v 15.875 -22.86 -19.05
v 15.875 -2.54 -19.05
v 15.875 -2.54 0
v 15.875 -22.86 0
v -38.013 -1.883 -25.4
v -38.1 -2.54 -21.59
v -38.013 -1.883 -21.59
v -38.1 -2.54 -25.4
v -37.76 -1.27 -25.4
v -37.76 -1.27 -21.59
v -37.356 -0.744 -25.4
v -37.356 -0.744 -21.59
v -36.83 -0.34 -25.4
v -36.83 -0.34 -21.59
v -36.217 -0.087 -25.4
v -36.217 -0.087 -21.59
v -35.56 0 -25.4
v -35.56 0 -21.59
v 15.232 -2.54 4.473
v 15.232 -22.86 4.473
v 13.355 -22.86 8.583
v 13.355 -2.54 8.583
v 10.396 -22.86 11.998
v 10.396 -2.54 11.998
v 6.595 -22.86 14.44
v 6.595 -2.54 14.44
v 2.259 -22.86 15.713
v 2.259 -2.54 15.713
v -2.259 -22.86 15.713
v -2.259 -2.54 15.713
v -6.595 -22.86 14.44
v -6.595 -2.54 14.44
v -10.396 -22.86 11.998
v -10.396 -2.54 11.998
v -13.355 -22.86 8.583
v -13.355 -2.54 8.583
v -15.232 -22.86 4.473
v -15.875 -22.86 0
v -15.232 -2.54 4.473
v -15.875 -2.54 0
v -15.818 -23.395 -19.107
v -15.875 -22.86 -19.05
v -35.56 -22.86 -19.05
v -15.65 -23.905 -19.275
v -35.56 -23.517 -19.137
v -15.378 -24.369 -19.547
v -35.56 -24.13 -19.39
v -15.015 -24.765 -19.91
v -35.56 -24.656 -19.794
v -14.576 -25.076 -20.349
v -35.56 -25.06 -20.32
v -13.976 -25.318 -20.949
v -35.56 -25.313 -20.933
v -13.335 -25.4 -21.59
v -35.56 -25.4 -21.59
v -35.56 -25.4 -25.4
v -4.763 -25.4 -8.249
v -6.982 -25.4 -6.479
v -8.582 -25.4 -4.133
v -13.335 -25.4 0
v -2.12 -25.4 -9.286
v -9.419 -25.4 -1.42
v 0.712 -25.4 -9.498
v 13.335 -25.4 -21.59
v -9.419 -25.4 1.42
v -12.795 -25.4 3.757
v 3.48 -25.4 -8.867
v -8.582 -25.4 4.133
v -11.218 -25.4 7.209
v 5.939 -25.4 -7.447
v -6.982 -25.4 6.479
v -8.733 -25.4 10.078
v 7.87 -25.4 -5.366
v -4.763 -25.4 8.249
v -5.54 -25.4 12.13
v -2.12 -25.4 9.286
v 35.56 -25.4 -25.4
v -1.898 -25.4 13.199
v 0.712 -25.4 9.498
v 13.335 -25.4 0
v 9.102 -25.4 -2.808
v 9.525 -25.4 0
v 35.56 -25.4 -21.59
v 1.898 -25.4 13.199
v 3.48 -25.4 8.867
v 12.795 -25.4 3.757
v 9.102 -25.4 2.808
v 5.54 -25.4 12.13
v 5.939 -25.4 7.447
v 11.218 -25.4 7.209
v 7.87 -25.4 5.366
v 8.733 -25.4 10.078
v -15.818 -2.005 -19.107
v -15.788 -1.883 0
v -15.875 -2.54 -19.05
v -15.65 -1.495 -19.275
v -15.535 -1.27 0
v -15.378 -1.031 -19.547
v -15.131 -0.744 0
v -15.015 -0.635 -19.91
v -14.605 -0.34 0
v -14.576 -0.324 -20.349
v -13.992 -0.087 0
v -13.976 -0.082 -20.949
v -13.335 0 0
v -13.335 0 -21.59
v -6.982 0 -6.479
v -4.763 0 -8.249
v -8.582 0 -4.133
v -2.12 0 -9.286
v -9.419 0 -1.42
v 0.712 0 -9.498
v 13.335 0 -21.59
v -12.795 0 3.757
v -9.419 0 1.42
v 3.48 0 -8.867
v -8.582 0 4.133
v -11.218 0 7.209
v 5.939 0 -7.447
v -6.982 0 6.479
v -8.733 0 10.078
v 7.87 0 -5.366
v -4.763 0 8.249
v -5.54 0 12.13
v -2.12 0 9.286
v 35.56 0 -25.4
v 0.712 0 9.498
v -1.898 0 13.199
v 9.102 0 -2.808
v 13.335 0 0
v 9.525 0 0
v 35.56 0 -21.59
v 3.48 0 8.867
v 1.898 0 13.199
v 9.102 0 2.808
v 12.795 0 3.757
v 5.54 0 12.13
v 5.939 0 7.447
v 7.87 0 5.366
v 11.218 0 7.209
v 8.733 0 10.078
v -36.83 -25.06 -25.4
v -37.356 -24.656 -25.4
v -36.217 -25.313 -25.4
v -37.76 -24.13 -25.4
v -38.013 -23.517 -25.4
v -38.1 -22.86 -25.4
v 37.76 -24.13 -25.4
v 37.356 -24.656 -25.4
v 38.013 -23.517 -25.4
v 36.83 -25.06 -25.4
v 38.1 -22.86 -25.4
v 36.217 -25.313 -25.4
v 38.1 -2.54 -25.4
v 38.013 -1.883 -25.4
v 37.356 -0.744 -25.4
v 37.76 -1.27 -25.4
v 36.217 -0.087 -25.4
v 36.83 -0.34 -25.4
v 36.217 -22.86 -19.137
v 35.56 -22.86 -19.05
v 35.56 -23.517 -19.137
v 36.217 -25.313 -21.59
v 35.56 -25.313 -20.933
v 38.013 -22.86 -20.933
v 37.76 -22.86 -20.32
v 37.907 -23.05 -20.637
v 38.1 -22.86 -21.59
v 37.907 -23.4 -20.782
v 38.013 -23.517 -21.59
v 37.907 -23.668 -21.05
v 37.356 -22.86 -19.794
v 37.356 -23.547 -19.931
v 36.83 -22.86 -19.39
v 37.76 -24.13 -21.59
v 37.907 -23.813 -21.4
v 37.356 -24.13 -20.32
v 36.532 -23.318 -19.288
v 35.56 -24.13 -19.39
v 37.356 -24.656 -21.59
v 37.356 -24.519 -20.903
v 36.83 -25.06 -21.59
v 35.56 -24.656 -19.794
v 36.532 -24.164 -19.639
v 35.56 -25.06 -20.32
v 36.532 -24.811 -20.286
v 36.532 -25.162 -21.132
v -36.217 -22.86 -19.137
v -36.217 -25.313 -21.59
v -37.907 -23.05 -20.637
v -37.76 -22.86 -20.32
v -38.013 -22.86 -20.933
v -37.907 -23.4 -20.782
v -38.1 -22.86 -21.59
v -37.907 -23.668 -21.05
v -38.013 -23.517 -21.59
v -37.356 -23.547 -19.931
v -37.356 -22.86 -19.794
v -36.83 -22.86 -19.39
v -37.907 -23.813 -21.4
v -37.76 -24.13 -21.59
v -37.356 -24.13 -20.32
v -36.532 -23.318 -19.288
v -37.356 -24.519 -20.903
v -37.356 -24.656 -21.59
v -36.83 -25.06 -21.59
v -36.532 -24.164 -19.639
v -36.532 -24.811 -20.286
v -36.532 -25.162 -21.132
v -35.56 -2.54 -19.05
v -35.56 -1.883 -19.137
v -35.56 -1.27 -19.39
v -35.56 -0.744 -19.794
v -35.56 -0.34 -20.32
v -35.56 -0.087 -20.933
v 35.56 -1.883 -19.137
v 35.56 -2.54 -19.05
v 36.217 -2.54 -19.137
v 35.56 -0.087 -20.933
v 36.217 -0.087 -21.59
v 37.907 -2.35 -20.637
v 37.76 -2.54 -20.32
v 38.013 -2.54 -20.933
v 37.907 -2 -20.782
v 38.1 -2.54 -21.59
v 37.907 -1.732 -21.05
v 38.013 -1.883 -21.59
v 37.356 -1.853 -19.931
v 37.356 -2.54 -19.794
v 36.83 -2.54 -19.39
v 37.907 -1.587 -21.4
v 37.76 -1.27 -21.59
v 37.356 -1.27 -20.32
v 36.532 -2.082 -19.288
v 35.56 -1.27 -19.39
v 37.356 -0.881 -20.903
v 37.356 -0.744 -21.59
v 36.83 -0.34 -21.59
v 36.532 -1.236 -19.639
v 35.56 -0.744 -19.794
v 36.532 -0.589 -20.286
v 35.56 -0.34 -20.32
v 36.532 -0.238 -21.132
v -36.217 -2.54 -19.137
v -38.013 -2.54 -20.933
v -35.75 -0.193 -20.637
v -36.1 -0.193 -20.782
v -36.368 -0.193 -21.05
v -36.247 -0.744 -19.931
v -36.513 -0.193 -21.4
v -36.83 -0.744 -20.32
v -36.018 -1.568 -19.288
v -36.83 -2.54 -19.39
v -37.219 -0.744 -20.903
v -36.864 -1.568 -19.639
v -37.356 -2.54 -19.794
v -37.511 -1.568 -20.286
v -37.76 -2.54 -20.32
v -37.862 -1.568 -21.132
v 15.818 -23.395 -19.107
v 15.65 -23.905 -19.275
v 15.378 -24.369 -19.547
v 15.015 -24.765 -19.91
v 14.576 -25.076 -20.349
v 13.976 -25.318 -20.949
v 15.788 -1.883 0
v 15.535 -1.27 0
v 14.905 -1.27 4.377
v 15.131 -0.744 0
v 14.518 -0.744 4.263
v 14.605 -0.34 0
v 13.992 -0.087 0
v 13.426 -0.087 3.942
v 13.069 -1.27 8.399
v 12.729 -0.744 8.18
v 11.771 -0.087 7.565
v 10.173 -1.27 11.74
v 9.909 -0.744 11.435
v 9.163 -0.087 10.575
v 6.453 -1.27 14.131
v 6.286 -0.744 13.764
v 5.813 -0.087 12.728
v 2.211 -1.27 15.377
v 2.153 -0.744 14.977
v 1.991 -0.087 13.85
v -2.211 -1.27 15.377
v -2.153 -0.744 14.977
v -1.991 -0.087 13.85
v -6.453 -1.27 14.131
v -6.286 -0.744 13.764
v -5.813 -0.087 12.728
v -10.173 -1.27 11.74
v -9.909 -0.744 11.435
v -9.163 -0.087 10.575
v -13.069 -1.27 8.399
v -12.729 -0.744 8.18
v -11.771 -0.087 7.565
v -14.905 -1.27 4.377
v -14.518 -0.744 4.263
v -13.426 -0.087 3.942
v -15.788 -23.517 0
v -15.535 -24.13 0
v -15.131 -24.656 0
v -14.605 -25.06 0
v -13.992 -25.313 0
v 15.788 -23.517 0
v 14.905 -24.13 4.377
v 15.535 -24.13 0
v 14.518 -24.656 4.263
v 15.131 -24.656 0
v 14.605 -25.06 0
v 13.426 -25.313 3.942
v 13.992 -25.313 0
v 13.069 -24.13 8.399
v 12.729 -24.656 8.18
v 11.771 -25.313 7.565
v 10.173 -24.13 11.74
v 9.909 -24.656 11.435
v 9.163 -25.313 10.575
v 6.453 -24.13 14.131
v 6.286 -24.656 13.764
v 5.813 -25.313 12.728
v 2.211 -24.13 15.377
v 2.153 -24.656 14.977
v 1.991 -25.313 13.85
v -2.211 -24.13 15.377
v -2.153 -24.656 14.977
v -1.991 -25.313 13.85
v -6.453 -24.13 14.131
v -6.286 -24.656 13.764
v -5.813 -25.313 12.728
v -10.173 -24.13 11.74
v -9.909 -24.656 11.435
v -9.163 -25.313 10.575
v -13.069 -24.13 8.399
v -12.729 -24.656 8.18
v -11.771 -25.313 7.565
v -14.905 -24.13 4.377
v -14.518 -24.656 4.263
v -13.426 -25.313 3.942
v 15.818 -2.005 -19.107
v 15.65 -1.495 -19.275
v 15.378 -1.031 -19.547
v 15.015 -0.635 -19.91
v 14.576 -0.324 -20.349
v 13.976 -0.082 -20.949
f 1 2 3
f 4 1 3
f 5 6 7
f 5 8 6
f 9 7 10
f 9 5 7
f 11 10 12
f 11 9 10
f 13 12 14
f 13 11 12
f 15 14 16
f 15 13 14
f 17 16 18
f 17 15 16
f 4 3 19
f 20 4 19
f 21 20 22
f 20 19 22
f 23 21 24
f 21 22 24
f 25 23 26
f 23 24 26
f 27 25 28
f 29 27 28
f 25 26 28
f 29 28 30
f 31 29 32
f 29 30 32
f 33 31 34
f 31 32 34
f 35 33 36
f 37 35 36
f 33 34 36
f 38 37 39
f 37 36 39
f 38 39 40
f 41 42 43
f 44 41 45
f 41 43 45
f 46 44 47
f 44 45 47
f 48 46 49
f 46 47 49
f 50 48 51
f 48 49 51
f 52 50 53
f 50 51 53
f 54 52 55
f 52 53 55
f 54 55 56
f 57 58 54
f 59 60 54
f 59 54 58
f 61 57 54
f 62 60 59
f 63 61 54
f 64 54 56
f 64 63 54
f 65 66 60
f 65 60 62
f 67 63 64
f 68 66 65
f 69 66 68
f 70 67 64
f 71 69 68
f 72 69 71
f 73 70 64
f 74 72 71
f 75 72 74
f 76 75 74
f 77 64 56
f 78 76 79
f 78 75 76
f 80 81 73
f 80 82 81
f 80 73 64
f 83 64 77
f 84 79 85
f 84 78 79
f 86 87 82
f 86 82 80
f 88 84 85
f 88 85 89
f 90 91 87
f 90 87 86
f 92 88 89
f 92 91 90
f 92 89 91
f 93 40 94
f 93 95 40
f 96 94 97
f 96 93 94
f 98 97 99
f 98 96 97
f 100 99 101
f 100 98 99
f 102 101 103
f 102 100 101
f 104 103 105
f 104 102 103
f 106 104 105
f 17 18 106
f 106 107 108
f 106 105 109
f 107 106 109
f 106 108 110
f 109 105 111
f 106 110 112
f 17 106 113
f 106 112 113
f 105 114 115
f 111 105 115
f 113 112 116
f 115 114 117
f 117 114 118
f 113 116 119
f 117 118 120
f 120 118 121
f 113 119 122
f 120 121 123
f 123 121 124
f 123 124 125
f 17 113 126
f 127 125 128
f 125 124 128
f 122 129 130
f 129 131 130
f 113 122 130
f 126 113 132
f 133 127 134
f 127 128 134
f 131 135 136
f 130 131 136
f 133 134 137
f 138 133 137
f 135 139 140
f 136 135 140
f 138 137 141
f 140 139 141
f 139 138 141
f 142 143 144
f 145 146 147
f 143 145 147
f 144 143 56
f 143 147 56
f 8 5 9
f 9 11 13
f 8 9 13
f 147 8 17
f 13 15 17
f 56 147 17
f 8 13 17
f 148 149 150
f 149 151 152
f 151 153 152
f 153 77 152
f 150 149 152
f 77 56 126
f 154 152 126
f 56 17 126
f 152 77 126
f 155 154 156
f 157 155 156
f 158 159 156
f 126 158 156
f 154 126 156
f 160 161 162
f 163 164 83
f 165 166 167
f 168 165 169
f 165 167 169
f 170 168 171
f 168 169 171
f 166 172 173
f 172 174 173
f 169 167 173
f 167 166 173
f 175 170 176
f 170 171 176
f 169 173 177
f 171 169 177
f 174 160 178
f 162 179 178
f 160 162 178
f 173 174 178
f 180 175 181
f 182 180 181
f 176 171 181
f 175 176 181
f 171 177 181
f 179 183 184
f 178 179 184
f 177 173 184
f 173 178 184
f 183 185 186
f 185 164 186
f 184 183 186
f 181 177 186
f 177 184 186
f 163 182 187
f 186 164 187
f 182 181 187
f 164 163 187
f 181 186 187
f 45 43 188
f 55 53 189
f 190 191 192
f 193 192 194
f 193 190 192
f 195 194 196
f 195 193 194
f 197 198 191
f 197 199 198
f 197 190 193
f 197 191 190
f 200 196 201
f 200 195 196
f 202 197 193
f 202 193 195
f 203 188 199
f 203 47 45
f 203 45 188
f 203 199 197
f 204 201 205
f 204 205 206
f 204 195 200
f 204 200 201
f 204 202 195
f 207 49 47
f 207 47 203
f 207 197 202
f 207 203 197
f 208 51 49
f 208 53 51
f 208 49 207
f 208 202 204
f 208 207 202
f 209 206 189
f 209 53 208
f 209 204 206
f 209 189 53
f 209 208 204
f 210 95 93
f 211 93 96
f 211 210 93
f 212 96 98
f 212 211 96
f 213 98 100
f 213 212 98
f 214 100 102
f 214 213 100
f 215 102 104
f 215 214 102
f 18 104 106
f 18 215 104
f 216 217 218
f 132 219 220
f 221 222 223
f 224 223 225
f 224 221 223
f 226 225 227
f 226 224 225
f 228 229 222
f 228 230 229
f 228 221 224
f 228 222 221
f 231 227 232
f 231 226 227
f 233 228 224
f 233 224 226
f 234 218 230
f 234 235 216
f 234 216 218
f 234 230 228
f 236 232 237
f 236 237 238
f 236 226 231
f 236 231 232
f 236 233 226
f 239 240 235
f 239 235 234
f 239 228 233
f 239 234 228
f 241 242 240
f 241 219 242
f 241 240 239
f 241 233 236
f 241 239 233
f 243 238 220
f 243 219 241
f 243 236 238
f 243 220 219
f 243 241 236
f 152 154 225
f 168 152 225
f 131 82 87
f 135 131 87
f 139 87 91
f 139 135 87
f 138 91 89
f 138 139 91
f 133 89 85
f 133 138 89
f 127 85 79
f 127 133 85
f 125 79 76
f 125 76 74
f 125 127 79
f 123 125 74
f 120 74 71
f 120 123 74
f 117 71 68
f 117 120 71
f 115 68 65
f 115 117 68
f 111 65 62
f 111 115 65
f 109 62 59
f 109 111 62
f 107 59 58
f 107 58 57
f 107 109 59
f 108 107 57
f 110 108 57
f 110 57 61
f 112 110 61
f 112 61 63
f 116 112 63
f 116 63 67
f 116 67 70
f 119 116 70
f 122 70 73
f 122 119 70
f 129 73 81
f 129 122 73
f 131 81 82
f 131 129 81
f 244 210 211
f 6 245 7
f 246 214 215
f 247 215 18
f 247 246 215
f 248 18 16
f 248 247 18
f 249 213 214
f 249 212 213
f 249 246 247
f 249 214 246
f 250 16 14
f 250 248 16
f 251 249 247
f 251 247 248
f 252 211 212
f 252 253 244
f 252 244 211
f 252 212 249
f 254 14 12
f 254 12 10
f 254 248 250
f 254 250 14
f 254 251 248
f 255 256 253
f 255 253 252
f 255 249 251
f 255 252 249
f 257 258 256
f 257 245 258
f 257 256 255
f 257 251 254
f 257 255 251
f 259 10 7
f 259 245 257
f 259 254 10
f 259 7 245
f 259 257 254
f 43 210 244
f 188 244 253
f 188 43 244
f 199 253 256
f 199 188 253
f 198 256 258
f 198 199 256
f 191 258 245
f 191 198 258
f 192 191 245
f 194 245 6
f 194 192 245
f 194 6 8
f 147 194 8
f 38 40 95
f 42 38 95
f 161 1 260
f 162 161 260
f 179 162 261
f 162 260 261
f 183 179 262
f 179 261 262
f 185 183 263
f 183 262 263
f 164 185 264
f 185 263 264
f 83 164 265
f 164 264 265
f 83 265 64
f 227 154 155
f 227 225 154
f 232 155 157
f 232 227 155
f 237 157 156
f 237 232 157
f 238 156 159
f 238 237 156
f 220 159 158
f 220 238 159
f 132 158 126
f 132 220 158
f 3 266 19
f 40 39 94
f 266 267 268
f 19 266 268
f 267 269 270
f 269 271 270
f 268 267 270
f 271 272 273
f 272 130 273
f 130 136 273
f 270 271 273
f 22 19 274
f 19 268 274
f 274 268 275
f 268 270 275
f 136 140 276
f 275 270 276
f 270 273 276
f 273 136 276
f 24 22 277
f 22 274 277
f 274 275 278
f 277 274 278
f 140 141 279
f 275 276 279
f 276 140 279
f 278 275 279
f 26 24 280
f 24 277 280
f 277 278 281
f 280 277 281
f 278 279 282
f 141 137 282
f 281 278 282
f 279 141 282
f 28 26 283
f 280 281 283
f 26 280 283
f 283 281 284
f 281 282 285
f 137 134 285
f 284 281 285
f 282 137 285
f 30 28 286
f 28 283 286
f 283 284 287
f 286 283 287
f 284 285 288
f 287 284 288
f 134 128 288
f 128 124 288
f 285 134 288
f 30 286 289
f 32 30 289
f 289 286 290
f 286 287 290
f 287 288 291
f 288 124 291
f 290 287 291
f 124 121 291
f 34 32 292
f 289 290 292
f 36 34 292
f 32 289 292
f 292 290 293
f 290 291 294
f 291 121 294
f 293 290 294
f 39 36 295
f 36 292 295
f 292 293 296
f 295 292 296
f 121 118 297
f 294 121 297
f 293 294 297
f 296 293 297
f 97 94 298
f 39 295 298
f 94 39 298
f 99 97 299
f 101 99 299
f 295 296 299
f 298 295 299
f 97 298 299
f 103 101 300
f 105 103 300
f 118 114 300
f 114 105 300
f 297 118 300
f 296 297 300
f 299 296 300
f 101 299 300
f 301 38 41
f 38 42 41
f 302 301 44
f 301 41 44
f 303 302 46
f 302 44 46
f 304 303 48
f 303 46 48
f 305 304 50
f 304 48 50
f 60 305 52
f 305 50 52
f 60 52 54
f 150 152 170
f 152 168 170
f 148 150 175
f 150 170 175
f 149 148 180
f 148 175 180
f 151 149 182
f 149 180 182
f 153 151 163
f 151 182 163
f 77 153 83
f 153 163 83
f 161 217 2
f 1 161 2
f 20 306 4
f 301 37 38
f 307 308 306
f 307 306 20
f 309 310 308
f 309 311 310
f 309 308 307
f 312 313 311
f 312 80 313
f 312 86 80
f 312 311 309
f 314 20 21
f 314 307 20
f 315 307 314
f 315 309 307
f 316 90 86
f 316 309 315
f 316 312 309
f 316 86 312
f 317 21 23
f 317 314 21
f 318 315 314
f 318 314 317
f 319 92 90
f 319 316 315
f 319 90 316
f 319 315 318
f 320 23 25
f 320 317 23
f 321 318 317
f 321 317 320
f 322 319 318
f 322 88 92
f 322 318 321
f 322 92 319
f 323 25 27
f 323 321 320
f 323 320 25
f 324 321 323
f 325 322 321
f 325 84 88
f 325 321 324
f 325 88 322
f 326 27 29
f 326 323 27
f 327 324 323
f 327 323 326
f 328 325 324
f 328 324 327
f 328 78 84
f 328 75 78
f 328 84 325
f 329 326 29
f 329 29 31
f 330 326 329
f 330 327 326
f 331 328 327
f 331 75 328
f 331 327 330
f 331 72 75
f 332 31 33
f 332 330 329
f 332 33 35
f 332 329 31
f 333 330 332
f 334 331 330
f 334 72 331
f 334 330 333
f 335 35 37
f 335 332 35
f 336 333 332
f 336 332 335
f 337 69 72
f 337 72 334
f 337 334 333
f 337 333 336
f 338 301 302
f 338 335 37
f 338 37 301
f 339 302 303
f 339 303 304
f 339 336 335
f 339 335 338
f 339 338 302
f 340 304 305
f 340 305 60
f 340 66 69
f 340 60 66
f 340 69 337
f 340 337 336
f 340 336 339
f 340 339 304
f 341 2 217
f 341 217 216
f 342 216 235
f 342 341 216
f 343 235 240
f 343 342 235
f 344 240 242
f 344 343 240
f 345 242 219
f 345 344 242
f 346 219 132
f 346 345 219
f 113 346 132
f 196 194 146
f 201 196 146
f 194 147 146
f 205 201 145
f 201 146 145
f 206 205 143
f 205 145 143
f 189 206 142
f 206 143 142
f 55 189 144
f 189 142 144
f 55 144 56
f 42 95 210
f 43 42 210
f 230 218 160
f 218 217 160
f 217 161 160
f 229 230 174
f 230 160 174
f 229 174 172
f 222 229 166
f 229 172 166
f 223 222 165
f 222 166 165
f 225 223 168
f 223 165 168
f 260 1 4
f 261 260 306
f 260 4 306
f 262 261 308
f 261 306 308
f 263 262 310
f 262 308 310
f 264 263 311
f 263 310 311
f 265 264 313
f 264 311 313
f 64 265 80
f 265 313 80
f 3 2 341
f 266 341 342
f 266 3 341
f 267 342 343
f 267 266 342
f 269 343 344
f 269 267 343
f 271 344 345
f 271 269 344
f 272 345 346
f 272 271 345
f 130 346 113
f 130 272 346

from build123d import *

# Parameters (mm, degrees)
F0_R     = 9.525
F1_DEPTH = 25.4
F2_R     = 2.54


with BuildPart() as f1:
    # F0 (on Front) → F1 (new body)
    with BuildSketch(Plane.XZ):
        with BuildLine():
            Line((15.875, -19.05), (15.875, 0))
            ThreePointArc((15.875, 0), (0, 15.875), (-15.875, 0))
            Line((-15.875, 0), (-15.875, -19.05))
            Line((-15.875, -19.05), (-38.1, -19.05))
            Line((-38.1, -19.05), (-38.1, -25.4))
            Line((-38.1, -25.4), (0, -25.4))
            Line((0, -25.4), (38.1, -25.4))
            Line((38.1, -25.4), (38.1, -19.05))
            Line((38.1, -19.05), (15.875, -19.05))
        make_face()
        Circle(F0_R, mode=Mode.SUBTRACT)
    extrude(amount=F1_DEPTH)

    # F2
    f2_edges = [f1.edges().sort_by_distance(p)[0] for p in [
        (0, -25.4, 15.875),
        (0, 0, 15.875),
        (-15.875, -25.4, -9.525),
        (15.875, -25.4, -9.525),
        (26.9875, -25.4, -19.05),
        (-26.9875, -25.4, -19.05),
        (-38.1, -12.7, -19.05),
        (-26.9875, 0, -19.05),
        (-15.875, 0, -9.525),
        (15.875, 0, -9.525),
        (26.9875, 0, -19.05),
        (38.1, -12.7, -19.05),
        (-38.1, -25.4, -22.225),
        (-38.1, 0, -22.225),
        (38.1, 0, -22.225),
        (38.1, -25.4, -22.225),
    ]]
    fillet(f2_edges, radius=F2_R)


solid = f1.part
